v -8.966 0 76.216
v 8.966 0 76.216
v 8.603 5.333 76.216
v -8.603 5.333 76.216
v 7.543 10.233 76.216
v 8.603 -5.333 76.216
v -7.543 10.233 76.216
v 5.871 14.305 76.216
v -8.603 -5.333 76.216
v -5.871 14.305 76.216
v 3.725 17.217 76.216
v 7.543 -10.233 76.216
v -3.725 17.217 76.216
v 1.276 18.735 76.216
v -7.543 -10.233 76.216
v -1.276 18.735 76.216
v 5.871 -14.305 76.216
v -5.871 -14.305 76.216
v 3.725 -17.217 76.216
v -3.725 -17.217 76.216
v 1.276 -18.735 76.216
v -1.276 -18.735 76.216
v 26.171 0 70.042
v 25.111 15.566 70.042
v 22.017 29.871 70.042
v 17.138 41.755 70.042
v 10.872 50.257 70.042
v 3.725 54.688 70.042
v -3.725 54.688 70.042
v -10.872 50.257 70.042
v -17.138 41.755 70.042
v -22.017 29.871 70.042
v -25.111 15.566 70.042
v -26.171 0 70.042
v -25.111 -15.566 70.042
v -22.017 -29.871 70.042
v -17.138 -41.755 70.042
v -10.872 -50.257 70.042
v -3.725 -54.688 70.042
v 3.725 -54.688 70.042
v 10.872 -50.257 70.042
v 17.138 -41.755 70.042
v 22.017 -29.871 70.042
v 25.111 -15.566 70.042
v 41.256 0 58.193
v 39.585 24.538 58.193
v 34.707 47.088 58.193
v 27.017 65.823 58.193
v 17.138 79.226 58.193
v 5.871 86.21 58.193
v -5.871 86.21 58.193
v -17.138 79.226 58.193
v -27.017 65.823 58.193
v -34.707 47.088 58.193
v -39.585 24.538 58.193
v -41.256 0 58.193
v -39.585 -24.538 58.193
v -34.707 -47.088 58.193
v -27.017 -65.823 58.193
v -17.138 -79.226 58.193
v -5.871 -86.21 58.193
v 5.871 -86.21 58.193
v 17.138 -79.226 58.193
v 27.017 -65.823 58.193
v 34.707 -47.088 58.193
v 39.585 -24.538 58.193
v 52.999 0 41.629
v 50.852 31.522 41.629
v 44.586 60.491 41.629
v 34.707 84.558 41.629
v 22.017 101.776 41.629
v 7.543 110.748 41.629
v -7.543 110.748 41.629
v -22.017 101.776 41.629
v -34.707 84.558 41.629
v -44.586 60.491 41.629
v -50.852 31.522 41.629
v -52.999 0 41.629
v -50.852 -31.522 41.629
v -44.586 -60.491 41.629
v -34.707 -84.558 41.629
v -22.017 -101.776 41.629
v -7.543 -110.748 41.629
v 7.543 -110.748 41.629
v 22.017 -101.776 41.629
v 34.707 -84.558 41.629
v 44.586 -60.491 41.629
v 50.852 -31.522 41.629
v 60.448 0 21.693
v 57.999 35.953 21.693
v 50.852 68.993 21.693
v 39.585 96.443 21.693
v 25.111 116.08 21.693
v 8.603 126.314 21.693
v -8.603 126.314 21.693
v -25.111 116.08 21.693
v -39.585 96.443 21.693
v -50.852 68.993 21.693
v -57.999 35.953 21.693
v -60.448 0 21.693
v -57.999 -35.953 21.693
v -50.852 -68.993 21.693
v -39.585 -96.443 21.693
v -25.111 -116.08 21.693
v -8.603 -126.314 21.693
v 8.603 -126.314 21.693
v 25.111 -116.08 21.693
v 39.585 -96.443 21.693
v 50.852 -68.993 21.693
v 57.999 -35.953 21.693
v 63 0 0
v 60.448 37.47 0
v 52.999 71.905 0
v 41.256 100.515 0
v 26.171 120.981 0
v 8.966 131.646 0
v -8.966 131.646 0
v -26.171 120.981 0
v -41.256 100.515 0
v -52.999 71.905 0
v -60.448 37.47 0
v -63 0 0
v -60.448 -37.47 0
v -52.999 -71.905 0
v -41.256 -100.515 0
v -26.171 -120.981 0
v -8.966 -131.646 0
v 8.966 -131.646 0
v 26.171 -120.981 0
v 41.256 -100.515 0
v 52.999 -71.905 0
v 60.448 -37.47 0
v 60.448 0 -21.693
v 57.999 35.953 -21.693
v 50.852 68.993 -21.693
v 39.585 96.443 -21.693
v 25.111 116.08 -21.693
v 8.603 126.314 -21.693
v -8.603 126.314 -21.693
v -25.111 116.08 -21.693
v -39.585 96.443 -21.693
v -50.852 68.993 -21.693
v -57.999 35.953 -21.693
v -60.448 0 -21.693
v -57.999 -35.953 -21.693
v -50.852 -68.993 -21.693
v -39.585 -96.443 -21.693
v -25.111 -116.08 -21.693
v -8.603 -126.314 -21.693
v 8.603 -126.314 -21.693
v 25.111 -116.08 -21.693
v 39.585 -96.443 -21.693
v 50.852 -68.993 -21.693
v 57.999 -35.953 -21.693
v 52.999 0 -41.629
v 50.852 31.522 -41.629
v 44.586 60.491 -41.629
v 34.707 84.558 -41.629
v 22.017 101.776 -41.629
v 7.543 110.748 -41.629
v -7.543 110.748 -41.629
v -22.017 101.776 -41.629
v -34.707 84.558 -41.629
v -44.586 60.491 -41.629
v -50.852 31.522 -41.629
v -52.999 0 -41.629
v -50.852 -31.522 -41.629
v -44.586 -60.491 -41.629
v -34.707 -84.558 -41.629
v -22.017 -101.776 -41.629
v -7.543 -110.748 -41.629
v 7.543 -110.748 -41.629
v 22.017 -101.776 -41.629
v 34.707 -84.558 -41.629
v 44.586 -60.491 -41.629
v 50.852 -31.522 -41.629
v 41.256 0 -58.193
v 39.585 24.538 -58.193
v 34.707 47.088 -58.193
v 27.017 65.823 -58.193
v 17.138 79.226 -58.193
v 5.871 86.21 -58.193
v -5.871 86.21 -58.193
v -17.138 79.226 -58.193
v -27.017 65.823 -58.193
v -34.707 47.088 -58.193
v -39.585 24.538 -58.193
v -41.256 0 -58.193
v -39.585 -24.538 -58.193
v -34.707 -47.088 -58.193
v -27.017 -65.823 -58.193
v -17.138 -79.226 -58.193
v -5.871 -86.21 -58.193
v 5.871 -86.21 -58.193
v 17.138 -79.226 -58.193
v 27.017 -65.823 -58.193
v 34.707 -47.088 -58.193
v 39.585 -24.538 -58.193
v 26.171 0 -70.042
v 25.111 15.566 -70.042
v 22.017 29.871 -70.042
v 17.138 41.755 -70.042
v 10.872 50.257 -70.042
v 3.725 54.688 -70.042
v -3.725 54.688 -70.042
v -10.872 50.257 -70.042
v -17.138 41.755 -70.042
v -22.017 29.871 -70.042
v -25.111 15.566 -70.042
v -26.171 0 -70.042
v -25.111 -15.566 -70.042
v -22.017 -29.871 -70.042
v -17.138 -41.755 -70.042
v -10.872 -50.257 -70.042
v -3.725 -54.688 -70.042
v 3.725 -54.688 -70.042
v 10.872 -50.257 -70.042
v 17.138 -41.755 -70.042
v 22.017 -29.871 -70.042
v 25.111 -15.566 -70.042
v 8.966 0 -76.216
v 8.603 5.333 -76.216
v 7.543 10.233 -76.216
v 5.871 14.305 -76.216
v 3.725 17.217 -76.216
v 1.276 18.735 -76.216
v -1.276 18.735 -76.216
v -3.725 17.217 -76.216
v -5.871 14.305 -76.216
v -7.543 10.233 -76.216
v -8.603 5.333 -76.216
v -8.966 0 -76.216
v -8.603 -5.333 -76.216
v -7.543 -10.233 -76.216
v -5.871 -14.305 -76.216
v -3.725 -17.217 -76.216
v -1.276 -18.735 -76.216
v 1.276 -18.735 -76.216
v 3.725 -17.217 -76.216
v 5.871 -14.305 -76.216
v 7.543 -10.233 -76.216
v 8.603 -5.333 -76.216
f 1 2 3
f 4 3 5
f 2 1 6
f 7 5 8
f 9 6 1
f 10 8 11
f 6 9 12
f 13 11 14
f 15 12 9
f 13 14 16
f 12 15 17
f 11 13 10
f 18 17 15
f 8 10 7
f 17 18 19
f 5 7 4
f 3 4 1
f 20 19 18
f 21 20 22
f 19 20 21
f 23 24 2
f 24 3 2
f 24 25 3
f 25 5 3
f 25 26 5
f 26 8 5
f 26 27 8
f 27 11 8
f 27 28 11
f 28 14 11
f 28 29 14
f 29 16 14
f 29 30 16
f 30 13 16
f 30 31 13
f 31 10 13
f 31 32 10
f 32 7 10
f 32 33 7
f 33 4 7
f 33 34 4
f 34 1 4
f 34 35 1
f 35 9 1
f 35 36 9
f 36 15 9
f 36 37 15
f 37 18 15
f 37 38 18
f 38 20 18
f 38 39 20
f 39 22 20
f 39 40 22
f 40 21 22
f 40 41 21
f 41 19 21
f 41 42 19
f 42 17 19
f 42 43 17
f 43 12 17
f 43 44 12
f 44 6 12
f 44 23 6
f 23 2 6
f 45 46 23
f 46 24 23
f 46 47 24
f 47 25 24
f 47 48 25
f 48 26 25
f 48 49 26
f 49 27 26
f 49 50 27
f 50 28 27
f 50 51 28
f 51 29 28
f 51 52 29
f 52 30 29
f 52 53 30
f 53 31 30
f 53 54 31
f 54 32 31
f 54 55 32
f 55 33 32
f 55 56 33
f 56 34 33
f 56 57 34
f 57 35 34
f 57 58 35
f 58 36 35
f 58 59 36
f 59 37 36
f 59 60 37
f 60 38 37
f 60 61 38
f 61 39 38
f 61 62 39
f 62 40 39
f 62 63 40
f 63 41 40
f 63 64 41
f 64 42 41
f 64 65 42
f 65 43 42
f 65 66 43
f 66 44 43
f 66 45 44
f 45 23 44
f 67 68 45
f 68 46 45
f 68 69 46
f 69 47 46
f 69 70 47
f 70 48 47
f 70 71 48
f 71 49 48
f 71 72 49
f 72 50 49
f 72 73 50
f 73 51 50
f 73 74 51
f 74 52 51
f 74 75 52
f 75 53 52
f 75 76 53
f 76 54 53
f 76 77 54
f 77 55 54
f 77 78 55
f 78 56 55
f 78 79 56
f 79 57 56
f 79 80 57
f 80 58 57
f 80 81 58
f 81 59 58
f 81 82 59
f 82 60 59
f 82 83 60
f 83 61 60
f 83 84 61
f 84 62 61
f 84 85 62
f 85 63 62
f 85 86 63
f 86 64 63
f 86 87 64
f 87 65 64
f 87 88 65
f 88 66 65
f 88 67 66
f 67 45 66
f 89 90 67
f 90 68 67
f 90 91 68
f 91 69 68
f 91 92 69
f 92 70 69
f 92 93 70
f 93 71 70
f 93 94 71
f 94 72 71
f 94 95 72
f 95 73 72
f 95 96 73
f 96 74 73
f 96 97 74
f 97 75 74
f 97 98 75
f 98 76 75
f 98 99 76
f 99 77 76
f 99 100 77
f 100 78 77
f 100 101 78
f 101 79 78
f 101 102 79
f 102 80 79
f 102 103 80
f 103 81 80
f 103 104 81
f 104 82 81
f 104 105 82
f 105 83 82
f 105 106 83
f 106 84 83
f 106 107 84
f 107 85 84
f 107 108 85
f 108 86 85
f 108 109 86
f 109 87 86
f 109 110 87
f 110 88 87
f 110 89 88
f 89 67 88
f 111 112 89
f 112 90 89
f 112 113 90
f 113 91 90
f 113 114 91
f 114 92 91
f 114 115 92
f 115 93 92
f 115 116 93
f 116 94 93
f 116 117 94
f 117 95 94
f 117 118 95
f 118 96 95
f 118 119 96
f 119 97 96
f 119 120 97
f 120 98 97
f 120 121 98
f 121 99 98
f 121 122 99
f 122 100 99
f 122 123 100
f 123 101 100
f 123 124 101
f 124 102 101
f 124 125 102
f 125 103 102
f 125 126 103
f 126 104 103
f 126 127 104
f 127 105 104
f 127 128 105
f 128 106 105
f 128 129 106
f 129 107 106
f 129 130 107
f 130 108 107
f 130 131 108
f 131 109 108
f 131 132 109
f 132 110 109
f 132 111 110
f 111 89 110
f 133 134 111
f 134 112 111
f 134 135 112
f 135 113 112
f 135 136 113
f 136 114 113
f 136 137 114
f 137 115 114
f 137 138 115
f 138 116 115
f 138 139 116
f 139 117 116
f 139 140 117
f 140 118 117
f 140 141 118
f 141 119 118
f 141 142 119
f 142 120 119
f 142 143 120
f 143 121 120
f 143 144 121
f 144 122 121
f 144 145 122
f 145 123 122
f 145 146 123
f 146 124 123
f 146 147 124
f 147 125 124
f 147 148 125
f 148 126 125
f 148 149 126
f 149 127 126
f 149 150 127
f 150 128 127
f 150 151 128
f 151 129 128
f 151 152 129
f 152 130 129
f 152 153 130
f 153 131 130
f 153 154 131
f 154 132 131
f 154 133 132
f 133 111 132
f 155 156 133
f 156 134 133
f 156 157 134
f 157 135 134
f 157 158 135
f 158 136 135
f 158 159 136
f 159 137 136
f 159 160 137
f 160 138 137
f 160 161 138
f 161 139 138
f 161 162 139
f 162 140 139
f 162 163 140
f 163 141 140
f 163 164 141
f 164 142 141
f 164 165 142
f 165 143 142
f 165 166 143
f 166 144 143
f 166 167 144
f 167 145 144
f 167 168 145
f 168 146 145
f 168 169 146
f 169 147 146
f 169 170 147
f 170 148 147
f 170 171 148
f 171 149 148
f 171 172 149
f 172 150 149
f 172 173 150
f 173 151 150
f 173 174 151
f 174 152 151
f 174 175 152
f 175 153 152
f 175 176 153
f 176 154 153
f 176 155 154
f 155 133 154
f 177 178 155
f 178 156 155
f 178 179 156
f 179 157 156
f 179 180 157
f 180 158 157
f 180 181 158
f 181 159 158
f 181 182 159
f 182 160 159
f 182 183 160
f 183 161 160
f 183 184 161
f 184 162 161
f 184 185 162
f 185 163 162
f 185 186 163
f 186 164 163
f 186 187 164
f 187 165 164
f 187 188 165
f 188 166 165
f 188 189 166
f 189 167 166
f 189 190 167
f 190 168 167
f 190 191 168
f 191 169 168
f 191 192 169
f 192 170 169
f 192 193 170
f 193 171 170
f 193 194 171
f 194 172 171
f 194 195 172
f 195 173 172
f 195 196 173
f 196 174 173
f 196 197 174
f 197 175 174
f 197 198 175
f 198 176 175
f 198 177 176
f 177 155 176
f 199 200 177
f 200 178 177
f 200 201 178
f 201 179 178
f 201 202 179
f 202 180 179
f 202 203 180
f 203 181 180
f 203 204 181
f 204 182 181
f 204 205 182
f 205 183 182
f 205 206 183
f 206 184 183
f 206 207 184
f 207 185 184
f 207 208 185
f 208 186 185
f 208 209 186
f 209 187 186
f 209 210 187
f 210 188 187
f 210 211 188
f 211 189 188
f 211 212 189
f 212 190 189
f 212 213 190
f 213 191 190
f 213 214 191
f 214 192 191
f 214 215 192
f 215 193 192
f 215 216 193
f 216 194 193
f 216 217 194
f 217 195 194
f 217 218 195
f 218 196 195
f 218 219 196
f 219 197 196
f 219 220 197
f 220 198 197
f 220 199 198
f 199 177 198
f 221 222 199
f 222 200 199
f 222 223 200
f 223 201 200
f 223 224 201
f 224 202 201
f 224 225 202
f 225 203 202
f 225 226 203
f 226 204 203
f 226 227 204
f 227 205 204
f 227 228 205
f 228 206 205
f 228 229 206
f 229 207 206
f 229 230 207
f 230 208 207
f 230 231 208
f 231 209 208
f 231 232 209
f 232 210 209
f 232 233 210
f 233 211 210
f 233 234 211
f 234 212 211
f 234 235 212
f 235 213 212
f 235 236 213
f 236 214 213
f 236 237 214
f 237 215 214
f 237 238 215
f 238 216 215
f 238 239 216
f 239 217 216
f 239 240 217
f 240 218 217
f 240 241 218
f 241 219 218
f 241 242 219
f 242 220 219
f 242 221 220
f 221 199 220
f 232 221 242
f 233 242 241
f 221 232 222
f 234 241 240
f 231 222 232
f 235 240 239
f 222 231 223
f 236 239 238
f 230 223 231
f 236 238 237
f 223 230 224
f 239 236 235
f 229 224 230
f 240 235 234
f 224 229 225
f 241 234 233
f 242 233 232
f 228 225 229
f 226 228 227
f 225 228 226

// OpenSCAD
// Generated by SolidPython 1.0.1 on 2020-07-29 00:46:49


scale(v = [9, 19, 11]) {
	sphere(r = 7);
}
/***********************************************
*********      SolidPython code:      **********
************************************************
 
# import packages: SolidPython
from solid import *
from solid.utils import *
from itertools import chain, combinations, permutations


class Resize:

    def __init__(self, scad_file):
        self.scad_file = scad_file
        #self.scad_file = import_scad(scad_file)
        # cone/cylinder param:
        self.r1 = 0
        self.r2 = 0
        self.h = 0
        # rectangular prism param:
        self.w = 0
        self.l = 0
        # ellipse param:
        self.r = 0

    # import OpenScad code (file name corresponds to shape)


    # classify shape + parameters
    def assign(self, param1, param2, param3):
        if self.scad_file == 'cone.scad':
            self.r1 = param1
            self.r2 = param2
            self.h = param3
        elif self.scad_file == 'cylinder.scad':
            self.r1 = param1
            self.r2 = param2
            self.h = param3
        elif self.scad_file == 'rectangularPrism.scad':
            self.h = param1
            self.l = param2
            self.w = param3
        else:
            self.r = param1
            self.h = param2

    # resize parameters
    def iterate(self):
        x = range(3, 20, 2)
        i = 1
        if self.scad_file == 'cone.scad':
            tempList = list(permutations(x, 2))
            for temp in tempList:
                param1 = temp[0]
                param2 = temp[1]
                filepath = 'produced_scad_files/' + 'cone' + str(param1) + '_' + str(param2) + '_' + '.scad'
                scad_render_to_file(cylinder(h=param1, r1=param2, r2=0), filepath)

        elif self.scad_file == 'cylinder.scad':
            tempList = list(permutations(x, 3))
            for temp in tempList:
                param1 = temp[0]
                param2 = temp[1]
                filepath = 'produced_scad_files/' + 'cylinder' + str(param1) + '_' + str(param2) + '_' + '.scad'
                scad_render_to_file(cylinder(h=param1, r1=param2, r2=param2), filepath)

        elif self.scad_file == 'rectangularPrism.scad':
            tempList = list(permutations(x, 3))
            for temp in tempList:
                param1 = temp[0]
                param2 = temp[1]
                param3 = temp[2]
                filepath = 'produced_scad_files/' + 'rectangularPrism' + str(param1) + '_' + str(param2) + '_' + str(
                    param3) + '.scad'
                scad_render_to_file(cube(size=(param1, param2, param3)), filepath)

        elif self.scad_file == 'ellipse.scad':
            tempList = list(permutations(x, 4))
            for temp in tempList:
                param1 = temp[0]
                param2 = temp[1]
                param3 = temp[2]
                param4 = temp[3]
                filepath = 'produced_scad_files/' + 'ellipse' + str(param1) + '_' + str(param2) + '_' + str(param3) + '_' + str(param4) + '.scad'
                scad_render_to_file(scale([param1, param2, param3])(sphere(r=param4)), filepath)

    def render_to_scadfile(self):
        scad_render_to_file(scad, 'example.scad') 
 
************************************************/
